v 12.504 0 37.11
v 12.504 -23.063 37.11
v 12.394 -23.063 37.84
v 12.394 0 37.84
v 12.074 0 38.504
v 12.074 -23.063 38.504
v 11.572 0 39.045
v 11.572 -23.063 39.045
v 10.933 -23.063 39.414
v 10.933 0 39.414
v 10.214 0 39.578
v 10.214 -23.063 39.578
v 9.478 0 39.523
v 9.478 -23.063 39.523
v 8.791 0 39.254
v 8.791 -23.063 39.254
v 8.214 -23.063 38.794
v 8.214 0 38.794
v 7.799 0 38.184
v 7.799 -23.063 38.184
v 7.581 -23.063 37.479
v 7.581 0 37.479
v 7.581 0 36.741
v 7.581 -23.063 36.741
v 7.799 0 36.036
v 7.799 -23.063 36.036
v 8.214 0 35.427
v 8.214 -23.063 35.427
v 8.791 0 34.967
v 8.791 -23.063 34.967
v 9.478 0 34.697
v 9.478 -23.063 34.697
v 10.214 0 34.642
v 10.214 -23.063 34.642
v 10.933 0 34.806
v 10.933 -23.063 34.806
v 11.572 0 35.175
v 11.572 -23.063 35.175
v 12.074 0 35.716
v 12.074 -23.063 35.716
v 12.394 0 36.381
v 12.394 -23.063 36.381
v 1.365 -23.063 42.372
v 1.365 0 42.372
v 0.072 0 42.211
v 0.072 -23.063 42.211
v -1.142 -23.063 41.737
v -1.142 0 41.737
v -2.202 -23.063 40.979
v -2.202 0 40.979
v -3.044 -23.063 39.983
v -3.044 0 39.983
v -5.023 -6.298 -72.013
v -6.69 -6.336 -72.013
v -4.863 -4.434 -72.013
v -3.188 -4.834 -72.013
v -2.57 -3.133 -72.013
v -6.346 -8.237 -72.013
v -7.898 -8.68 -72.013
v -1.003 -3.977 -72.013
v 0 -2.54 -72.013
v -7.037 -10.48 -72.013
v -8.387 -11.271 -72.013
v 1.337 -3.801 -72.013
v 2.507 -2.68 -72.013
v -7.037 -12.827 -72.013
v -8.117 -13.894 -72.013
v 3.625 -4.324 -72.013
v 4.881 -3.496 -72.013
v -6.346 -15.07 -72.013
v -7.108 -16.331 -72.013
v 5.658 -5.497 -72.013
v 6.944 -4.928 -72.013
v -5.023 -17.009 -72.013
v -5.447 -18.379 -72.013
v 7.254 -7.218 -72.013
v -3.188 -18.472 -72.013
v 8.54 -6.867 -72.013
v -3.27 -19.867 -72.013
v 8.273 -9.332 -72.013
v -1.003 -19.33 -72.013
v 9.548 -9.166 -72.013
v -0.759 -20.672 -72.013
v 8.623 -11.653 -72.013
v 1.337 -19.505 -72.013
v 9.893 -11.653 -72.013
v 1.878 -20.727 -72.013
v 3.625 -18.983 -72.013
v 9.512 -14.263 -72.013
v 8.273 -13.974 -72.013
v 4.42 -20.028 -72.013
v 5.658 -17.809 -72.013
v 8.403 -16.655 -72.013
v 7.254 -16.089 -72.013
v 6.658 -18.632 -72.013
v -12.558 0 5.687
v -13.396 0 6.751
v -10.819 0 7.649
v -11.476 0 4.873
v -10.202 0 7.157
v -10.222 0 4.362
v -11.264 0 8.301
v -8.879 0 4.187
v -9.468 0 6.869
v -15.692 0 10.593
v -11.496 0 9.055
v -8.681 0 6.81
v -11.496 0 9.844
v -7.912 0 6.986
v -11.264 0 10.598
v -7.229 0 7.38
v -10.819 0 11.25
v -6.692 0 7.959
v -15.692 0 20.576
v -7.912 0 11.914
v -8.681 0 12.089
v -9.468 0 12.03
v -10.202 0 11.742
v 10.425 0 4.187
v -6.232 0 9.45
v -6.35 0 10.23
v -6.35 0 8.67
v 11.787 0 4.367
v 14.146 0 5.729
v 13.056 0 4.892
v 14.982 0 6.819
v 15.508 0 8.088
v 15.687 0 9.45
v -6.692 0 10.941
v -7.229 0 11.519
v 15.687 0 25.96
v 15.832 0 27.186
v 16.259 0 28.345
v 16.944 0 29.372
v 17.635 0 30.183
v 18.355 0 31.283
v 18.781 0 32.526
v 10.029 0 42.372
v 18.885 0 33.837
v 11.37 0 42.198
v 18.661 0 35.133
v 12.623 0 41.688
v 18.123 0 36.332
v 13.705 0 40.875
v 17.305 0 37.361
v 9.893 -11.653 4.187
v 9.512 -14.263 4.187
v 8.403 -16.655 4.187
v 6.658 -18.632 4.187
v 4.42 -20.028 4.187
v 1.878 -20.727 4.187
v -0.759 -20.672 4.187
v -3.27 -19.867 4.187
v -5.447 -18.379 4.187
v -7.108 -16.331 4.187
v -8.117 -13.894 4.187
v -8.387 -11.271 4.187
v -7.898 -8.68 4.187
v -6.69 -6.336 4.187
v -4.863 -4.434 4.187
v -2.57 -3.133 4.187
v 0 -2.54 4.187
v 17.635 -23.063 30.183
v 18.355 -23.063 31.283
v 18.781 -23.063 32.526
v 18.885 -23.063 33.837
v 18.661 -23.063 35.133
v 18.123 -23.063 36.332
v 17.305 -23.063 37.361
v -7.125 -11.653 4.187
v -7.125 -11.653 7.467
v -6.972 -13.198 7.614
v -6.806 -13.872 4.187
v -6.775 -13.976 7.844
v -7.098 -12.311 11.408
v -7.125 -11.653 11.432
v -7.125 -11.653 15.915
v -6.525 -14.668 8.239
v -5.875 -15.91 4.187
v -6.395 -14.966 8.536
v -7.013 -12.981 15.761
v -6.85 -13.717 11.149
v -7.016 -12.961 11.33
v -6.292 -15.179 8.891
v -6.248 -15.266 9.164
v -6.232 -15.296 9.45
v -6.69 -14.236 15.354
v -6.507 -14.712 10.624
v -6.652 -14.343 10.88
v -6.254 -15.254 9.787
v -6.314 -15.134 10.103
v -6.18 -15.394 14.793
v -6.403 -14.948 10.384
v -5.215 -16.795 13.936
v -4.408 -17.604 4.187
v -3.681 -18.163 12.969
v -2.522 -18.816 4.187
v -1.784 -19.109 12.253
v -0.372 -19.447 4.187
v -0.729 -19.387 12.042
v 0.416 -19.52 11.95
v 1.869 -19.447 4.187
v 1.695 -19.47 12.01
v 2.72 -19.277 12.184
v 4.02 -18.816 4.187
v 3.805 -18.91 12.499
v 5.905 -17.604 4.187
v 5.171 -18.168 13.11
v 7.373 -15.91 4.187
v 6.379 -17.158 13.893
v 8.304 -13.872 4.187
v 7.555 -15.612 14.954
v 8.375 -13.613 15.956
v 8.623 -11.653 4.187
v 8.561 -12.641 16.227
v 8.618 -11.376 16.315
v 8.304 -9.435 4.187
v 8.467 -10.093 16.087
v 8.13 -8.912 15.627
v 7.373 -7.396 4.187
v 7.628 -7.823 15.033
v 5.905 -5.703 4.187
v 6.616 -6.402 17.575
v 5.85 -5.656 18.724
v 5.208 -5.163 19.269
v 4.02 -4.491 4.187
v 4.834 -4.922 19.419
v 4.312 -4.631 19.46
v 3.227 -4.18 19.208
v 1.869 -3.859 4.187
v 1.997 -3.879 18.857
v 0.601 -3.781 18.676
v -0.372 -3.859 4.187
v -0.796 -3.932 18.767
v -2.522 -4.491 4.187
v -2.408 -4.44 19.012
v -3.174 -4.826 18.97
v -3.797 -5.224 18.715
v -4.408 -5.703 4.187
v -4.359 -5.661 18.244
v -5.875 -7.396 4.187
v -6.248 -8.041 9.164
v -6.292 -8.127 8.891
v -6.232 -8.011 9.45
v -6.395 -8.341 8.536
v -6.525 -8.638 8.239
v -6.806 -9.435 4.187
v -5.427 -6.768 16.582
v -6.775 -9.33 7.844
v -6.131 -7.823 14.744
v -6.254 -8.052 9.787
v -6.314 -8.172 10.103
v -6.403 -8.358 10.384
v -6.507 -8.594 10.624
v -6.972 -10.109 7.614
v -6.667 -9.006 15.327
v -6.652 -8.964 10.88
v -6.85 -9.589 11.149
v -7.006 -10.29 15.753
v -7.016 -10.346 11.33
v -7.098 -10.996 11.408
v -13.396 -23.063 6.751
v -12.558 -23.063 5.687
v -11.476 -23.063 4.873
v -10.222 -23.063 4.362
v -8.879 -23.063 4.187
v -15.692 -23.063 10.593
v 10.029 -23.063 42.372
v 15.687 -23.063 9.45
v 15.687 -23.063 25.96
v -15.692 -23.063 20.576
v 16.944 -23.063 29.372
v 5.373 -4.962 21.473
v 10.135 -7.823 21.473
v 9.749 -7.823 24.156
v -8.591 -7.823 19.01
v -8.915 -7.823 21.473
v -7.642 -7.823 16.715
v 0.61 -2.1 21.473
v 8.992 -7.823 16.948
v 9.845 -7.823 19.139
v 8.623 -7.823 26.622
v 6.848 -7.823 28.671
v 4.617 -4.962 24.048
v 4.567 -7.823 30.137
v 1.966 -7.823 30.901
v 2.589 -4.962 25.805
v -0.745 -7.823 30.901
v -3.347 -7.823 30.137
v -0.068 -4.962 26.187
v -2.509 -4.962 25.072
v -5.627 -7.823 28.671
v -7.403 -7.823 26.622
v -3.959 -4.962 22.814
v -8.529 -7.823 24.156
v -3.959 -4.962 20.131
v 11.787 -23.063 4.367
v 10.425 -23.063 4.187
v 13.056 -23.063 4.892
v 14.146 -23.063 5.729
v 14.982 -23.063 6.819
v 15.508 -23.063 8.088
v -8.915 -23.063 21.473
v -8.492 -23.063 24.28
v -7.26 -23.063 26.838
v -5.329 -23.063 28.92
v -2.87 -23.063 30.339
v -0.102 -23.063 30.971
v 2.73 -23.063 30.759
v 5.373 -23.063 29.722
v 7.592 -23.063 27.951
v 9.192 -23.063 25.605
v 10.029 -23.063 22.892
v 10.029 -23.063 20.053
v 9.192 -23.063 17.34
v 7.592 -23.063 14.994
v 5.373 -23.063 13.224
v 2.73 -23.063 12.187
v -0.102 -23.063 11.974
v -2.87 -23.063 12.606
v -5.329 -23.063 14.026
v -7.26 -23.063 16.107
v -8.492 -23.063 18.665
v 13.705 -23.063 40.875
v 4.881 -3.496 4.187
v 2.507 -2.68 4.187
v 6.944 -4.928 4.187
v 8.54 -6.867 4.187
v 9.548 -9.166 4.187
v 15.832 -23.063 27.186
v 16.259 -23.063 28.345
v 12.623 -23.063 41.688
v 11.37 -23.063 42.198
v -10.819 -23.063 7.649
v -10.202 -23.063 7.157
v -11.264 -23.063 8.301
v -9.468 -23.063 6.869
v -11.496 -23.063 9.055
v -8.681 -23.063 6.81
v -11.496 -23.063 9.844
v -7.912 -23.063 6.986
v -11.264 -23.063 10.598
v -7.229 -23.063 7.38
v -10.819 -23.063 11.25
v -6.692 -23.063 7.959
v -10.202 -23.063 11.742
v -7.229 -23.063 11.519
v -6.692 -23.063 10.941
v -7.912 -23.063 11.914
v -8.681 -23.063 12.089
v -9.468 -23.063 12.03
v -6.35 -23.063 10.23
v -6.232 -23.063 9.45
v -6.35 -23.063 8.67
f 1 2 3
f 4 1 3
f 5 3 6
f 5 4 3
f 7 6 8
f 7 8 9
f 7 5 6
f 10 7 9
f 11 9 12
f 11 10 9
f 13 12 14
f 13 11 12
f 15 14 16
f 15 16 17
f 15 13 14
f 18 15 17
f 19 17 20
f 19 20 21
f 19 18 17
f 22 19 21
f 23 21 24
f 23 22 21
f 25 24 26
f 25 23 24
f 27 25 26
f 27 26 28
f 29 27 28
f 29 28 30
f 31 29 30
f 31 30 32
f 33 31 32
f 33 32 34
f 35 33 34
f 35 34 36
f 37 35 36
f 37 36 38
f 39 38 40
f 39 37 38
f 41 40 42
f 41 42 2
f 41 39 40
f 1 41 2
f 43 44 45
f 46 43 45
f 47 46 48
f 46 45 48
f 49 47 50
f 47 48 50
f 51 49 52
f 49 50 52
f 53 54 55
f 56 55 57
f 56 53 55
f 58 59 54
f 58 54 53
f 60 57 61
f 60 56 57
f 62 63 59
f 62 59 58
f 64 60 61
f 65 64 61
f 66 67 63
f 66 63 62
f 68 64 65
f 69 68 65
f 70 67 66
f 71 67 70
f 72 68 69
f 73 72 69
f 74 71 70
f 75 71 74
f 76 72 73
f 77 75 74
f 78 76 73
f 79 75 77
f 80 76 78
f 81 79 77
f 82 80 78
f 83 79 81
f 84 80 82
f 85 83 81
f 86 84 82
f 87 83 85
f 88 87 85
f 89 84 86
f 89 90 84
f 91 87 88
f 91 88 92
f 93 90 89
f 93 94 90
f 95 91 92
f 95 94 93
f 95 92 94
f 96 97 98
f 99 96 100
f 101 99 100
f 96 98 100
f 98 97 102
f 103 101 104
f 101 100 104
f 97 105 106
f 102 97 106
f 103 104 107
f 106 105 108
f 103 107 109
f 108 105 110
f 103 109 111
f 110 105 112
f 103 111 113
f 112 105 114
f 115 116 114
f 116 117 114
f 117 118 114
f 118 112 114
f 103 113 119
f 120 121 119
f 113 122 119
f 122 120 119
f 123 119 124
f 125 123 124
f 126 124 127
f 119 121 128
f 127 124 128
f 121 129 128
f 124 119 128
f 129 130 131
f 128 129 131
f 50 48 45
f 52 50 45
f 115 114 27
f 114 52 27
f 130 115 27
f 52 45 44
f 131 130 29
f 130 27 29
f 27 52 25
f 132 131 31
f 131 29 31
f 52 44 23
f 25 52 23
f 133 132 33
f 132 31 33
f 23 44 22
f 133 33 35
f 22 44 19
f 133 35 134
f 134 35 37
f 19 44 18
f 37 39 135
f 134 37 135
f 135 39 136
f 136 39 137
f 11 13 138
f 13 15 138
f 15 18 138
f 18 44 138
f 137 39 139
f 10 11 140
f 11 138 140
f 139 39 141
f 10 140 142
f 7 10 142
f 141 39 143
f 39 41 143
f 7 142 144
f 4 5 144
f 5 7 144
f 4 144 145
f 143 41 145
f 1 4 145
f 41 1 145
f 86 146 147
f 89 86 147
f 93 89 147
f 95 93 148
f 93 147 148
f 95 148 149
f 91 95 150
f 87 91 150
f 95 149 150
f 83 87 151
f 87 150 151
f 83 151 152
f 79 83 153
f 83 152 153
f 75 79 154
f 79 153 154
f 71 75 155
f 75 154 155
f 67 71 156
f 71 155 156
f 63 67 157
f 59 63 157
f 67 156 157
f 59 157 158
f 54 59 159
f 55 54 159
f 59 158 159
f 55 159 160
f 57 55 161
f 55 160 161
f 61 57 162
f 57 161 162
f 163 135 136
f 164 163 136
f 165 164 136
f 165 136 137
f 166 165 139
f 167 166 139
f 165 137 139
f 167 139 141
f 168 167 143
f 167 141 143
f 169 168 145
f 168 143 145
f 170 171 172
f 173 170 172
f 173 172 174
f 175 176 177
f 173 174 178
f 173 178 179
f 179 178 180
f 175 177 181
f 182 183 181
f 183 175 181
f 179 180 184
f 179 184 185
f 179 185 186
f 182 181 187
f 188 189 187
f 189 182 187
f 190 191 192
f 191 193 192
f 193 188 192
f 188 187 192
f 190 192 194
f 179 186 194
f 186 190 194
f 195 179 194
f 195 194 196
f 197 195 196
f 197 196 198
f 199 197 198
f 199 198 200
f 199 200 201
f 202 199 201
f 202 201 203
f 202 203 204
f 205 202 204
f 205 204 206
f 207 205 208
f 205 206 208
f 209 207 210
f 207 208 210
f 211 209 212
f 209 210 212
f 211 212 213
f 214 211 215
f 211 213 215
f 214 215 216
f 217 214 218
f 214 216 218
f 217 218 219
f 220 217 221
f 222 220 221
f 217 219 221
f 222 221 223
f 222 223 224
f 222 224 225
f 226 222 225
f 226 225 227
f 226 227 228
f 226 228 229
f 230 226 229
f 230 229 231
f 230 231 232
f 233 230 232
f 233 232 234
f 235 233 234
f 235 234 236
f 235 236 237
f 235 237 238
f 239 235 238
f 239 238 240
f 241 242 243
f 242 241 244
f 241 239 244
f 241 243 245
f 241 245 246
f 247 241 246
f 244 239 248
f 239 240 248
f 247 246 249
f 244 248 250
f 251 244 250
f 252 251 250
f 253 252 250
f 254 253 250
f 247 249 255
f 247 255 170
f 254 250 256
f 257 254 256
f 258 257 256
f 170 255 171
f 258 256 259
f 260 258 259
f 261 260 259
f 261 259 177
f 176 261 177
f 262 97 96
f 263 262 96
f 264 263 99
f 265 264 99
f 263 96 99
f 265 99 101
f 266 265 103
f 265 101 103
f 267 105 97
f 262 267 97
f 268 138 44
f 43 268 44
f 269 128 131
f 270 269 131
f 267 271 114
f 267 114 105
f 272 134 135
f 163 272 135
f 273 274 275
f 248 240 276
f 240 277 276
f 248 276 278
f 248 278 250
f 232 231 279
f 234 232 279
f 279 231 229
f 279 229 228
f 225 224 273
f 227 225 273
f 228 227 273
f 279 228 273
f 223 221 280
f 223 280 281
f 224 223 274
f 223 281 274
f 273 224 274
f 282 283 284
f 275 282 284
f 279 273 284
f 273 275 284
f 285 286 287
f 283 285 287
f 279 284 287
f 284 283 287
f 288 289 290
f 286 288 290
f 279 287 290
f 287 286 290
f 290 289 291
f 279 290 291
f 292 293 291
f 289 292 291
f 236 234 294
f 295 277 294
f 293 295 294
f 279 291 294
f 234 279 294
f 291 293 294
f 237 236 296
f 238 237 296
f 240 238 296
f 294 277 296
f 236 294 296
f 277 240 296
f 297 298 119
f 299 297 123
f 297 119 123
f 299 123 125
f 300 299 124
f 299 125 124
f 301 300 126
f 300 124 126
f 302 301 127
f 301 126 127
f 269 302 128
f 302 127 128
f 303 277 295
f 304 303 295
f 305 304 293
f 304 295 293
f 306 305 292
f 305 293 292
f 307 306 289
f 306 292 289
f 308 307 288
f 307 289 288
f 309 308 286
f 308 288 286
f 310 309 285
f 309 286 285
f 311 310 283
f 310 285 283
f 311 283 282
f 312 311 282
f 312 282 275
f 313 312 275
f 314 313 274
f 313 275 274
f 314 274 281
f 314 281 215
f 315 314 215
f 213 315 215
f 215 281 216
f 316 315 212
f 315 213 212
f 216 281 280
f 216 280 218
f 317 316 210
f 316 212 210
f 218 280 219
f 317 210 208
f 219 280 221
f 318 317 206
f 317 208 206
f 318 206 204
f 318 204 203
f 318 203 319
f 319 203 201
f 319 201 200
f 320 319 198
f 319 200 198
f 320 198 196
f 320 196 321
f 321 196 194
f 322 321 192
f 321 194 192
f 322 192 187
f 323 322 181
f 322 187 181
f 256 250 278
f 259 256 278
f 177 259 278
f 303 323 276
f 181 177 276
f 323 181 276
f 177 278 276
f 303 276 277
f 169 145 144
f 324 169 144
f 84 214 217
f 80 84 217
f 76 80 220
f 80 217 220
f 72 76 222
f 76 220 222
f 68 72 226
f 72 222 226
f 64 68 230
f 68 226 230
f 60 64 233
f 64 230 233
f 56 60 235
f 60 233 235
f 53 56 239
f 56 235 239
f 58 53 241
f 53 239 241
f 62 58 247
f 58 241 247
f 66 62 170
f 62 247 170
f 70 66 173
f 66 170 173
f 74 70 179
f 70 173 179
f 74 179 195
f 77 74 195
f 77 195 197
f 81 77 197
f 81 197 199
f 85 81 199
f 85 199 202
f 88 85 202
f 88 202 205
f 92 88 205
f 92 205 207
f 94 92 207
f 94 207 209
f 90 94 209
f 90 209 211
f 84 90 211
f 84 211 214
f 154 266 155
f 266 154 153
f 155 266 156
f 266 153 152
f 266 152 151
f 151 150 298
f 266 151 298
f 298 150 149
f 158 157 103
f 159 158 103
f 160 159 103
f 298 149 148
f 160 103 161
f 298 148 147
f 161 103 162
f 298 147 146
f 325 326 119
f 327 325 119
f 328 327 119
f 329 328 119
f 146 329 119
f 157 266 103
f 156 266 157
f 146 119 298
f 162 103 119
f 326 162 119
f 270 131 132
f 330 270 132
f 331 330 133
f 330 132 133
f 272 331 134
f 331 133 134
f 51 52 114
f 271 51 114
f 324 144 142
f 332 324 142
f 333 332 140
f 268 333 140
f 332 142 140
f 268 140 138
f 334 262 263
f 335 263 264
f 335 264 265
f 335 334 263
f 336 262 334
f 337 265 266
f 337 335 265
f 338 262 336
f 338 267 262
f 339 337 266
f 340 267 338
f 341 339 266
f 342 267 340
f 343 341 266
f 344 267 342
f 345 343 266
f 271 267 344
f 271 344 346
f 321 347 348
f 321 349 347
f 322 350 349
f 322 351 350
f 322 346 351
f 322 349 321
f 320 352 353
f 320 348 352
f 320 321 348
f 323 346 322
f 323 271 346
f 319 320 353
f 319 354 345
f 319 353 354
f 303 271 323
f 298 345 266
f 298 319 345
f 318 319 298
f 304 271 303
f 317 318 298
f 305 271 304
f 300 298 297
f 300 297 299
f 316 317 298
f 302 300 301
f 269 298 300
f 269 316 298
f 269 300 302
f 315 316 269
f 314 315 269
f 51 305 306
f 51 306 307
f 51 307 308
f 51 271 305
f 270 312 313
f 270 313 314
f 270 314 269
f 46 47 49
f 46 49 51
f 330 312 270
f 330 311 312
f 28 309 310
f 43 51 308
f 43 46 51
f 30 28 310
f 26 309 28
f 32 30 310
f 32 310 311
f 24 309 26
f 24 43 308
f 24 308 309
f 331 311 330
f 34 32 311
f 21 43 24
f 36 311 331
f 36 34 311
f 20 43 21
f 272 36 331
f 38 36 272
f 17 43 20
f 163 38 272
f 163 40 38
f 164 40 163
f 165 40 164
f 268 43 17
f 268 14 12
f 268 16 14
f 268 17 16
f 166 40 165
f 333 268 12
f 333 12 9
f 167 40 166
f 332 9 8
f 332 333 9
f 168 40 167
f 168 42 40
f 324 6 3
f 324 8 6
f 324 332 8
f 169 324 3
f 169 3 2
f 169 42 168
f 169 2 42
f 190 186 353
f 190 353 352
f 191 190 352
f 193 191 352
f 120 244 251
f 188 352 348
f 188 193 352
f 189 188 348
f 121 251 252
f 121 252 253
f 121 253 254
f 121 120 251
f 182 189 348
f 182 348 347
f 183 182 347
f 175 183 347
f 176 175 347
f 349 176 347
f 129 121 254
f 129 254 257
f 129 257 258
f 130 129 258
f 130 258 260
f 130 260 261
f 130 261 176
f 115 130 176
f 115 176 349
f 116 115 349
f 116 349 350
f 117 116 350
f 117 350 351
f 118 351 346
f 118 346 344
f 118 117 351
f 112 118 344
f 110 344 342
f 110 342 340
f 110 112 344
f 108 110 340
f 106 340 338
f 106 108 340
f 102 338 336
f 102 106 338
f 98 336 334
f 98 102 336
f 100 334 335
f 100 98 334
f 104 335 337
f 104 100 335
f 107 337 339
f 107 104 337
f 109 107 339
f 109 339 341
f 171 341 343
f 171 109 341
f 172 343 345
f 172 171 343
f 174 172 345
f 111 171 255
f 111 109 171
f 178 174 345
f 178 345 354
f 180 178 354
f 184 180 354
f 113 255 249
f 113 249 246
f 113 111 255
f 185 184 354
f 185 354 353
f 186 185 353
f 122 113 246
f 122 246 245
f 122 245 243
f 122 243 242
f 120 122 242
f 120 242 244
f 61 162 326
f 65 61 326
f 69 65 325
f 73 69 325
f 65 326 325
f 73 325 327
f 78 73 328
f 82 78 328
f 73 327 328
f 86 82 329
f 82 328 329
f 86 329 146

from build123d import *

# Parameters (mm, degrees)
F0_R     = 2.6468200674
F0_R_2   = 2.4751284116
F1_DEPTH = 23.0632
F3_D     = 19.05
F3_DEPTH = 15.24
F3_TIP   = 5.7231973962
F5_D     = 15.748
F5_DEPTH = 17.78
F5_TIP   = 4.7311765142
F6_DEPTH = 76.2
F7_D     = 15.748
F7_DEPTH = 78.74
F7_TIP   = 4.7311765142


with BuildPart() as f1:
    # F0 (on Front) → F1 (new body)
    with BuildSketch(Plane.XZ):
        with BuildLine():
            ThreePointArc((-13.3964658612, 6.7509404916), (-11.4760473771, 4.8729949891), (-8.8789812826, 4.1874775452))
            Line((-8.8789812826, 4.1874775452), (10.0976222454, 4.1874775452))
            Line((10.0976222454, 4.1874775452), (10.4250187174, 4.1874775452))
            ThreePointArc((10.4250187174, 4.1874775452), (14.1459697805, 5.7287459405), (15.6872381758, 9.4496970036))
            Line((15.6872381758, 9.4496970036), (15.6872381758, 25.9596970036))
            ThreePointArc((15.6872381758, 25.9596970036), (16.0113150838, 27.7778559021), (16.9436288703, 29.3720700112))
            Line((16.9436288703, 29.3720700112), (17.6345340249, 30.1831324991))
            ThreePointArc((17.6345340249, 30.1831324991), (18.8853795407, 33.8370197817), (17.3047602431, 37.3608173659))
            Line((17.3047602431, 37.3608173659), (13.7047539976, 40.875485311))
            ThreePointArc((13.7047539976, 40.875485311), (12.0132715508, 41.9838194669), (10.0286990154, 42.3723929102))
            Line((10.0286990154, 42.3723929102), (1.3647818566, 42.3723929102))
            ThreePointArc((1.3647818566, 42.3723929102), (-1.1423679176, 41.7367438487), (-3.0438160811, 39.9833629429))
            Line((-3.0438160811, 39.9833629429), (-15.6918746521, 20.5762875984))
            Line((-15.6918746521, 20.5762875984), (-15.6918746521, 10.5932559313))
            Line((-15.6918746521, 10.5932559313), (-13.3964658612, 6.7509404916))
        make_face()
        with Locations((-8.8789812826, 9.4496970036)):
            Circle(F0_R, mode=Mode.SUBTRACT)
        with Locations((10.0286990154, 37.1101734518)):
            Circle(F0_R_2, mode=Mode.SUBTRACT)
    extrude(amount=F1_DEPTH)

    # F3
    with Locations(Plane.XZ.offset(23.0632)):
        with Locations((0.6101487425, 21.472733464)):
            Hole(F3_D / 2, depth=F3_DEPTH)
            with Locations((0, 0, -(F3_DEPTH + F3_TIP / 2))):  # 118° drill point
                Cone(0, F3_D / 2, F3_TIP, mode=Mode.SUBTRACT)

    # F5
    with Locations(Plane(origin=(0, 0, 4.1874775452), x_dir=(1, 0, 0), z_dir=(0, 0, -1))):
        with Locations((0.7486785246, 11.6532988795)):
            Hole(F5_D / 2, depth=F5_DEPTH)
            with Locations((0, 0, -(F5_DEPTH + F5_TIP / 2))):  # 118° drill point
                Cone(0, F5_D / 2, F5_TIP, mode=Mode.SUBTRACT)

    # F4 (on face) → F6 (join)
    with BuildSketch(Plane(origin=(0, 0, 4.1874775452), x_dir=(1, 0, 0), z_dir=(0, 0, -1))):
        with BuildLine():
            ThreePointArc((9.8926785246, 11.6532988795), (-5.4467560676, 18.3785740571), (0, 2.54))
            ThreePointArc((0, 2.54), (6.9441131167, 4.9280237019), (9.8926785246, 11.6532988795))
        make_face()
    extrude(amount=F6_DEPTH)

    # F7 (one way)
    with BuildSketch(Plane.XY.offset(4.1874775452)):
        with Locations((0.7486785246, -11.6532988795)):
            Circle(F7_D / 2)
    extrude(amount=-F7_DEPTH, mode=Mode.SUBTRACT)
    with Locations(Plane.XY.offset(4.1874775452)):
        with Locations((0.7486785246, -11.6532988795)):
            with Locations((0, 0, -(F7_DEPTH + F7_TIP / 2))):  # 118° drill point
                Cone(0, F7_D / 2, F7_TIP, mode=Mode.SUBTRACT)


solid = f1.part
